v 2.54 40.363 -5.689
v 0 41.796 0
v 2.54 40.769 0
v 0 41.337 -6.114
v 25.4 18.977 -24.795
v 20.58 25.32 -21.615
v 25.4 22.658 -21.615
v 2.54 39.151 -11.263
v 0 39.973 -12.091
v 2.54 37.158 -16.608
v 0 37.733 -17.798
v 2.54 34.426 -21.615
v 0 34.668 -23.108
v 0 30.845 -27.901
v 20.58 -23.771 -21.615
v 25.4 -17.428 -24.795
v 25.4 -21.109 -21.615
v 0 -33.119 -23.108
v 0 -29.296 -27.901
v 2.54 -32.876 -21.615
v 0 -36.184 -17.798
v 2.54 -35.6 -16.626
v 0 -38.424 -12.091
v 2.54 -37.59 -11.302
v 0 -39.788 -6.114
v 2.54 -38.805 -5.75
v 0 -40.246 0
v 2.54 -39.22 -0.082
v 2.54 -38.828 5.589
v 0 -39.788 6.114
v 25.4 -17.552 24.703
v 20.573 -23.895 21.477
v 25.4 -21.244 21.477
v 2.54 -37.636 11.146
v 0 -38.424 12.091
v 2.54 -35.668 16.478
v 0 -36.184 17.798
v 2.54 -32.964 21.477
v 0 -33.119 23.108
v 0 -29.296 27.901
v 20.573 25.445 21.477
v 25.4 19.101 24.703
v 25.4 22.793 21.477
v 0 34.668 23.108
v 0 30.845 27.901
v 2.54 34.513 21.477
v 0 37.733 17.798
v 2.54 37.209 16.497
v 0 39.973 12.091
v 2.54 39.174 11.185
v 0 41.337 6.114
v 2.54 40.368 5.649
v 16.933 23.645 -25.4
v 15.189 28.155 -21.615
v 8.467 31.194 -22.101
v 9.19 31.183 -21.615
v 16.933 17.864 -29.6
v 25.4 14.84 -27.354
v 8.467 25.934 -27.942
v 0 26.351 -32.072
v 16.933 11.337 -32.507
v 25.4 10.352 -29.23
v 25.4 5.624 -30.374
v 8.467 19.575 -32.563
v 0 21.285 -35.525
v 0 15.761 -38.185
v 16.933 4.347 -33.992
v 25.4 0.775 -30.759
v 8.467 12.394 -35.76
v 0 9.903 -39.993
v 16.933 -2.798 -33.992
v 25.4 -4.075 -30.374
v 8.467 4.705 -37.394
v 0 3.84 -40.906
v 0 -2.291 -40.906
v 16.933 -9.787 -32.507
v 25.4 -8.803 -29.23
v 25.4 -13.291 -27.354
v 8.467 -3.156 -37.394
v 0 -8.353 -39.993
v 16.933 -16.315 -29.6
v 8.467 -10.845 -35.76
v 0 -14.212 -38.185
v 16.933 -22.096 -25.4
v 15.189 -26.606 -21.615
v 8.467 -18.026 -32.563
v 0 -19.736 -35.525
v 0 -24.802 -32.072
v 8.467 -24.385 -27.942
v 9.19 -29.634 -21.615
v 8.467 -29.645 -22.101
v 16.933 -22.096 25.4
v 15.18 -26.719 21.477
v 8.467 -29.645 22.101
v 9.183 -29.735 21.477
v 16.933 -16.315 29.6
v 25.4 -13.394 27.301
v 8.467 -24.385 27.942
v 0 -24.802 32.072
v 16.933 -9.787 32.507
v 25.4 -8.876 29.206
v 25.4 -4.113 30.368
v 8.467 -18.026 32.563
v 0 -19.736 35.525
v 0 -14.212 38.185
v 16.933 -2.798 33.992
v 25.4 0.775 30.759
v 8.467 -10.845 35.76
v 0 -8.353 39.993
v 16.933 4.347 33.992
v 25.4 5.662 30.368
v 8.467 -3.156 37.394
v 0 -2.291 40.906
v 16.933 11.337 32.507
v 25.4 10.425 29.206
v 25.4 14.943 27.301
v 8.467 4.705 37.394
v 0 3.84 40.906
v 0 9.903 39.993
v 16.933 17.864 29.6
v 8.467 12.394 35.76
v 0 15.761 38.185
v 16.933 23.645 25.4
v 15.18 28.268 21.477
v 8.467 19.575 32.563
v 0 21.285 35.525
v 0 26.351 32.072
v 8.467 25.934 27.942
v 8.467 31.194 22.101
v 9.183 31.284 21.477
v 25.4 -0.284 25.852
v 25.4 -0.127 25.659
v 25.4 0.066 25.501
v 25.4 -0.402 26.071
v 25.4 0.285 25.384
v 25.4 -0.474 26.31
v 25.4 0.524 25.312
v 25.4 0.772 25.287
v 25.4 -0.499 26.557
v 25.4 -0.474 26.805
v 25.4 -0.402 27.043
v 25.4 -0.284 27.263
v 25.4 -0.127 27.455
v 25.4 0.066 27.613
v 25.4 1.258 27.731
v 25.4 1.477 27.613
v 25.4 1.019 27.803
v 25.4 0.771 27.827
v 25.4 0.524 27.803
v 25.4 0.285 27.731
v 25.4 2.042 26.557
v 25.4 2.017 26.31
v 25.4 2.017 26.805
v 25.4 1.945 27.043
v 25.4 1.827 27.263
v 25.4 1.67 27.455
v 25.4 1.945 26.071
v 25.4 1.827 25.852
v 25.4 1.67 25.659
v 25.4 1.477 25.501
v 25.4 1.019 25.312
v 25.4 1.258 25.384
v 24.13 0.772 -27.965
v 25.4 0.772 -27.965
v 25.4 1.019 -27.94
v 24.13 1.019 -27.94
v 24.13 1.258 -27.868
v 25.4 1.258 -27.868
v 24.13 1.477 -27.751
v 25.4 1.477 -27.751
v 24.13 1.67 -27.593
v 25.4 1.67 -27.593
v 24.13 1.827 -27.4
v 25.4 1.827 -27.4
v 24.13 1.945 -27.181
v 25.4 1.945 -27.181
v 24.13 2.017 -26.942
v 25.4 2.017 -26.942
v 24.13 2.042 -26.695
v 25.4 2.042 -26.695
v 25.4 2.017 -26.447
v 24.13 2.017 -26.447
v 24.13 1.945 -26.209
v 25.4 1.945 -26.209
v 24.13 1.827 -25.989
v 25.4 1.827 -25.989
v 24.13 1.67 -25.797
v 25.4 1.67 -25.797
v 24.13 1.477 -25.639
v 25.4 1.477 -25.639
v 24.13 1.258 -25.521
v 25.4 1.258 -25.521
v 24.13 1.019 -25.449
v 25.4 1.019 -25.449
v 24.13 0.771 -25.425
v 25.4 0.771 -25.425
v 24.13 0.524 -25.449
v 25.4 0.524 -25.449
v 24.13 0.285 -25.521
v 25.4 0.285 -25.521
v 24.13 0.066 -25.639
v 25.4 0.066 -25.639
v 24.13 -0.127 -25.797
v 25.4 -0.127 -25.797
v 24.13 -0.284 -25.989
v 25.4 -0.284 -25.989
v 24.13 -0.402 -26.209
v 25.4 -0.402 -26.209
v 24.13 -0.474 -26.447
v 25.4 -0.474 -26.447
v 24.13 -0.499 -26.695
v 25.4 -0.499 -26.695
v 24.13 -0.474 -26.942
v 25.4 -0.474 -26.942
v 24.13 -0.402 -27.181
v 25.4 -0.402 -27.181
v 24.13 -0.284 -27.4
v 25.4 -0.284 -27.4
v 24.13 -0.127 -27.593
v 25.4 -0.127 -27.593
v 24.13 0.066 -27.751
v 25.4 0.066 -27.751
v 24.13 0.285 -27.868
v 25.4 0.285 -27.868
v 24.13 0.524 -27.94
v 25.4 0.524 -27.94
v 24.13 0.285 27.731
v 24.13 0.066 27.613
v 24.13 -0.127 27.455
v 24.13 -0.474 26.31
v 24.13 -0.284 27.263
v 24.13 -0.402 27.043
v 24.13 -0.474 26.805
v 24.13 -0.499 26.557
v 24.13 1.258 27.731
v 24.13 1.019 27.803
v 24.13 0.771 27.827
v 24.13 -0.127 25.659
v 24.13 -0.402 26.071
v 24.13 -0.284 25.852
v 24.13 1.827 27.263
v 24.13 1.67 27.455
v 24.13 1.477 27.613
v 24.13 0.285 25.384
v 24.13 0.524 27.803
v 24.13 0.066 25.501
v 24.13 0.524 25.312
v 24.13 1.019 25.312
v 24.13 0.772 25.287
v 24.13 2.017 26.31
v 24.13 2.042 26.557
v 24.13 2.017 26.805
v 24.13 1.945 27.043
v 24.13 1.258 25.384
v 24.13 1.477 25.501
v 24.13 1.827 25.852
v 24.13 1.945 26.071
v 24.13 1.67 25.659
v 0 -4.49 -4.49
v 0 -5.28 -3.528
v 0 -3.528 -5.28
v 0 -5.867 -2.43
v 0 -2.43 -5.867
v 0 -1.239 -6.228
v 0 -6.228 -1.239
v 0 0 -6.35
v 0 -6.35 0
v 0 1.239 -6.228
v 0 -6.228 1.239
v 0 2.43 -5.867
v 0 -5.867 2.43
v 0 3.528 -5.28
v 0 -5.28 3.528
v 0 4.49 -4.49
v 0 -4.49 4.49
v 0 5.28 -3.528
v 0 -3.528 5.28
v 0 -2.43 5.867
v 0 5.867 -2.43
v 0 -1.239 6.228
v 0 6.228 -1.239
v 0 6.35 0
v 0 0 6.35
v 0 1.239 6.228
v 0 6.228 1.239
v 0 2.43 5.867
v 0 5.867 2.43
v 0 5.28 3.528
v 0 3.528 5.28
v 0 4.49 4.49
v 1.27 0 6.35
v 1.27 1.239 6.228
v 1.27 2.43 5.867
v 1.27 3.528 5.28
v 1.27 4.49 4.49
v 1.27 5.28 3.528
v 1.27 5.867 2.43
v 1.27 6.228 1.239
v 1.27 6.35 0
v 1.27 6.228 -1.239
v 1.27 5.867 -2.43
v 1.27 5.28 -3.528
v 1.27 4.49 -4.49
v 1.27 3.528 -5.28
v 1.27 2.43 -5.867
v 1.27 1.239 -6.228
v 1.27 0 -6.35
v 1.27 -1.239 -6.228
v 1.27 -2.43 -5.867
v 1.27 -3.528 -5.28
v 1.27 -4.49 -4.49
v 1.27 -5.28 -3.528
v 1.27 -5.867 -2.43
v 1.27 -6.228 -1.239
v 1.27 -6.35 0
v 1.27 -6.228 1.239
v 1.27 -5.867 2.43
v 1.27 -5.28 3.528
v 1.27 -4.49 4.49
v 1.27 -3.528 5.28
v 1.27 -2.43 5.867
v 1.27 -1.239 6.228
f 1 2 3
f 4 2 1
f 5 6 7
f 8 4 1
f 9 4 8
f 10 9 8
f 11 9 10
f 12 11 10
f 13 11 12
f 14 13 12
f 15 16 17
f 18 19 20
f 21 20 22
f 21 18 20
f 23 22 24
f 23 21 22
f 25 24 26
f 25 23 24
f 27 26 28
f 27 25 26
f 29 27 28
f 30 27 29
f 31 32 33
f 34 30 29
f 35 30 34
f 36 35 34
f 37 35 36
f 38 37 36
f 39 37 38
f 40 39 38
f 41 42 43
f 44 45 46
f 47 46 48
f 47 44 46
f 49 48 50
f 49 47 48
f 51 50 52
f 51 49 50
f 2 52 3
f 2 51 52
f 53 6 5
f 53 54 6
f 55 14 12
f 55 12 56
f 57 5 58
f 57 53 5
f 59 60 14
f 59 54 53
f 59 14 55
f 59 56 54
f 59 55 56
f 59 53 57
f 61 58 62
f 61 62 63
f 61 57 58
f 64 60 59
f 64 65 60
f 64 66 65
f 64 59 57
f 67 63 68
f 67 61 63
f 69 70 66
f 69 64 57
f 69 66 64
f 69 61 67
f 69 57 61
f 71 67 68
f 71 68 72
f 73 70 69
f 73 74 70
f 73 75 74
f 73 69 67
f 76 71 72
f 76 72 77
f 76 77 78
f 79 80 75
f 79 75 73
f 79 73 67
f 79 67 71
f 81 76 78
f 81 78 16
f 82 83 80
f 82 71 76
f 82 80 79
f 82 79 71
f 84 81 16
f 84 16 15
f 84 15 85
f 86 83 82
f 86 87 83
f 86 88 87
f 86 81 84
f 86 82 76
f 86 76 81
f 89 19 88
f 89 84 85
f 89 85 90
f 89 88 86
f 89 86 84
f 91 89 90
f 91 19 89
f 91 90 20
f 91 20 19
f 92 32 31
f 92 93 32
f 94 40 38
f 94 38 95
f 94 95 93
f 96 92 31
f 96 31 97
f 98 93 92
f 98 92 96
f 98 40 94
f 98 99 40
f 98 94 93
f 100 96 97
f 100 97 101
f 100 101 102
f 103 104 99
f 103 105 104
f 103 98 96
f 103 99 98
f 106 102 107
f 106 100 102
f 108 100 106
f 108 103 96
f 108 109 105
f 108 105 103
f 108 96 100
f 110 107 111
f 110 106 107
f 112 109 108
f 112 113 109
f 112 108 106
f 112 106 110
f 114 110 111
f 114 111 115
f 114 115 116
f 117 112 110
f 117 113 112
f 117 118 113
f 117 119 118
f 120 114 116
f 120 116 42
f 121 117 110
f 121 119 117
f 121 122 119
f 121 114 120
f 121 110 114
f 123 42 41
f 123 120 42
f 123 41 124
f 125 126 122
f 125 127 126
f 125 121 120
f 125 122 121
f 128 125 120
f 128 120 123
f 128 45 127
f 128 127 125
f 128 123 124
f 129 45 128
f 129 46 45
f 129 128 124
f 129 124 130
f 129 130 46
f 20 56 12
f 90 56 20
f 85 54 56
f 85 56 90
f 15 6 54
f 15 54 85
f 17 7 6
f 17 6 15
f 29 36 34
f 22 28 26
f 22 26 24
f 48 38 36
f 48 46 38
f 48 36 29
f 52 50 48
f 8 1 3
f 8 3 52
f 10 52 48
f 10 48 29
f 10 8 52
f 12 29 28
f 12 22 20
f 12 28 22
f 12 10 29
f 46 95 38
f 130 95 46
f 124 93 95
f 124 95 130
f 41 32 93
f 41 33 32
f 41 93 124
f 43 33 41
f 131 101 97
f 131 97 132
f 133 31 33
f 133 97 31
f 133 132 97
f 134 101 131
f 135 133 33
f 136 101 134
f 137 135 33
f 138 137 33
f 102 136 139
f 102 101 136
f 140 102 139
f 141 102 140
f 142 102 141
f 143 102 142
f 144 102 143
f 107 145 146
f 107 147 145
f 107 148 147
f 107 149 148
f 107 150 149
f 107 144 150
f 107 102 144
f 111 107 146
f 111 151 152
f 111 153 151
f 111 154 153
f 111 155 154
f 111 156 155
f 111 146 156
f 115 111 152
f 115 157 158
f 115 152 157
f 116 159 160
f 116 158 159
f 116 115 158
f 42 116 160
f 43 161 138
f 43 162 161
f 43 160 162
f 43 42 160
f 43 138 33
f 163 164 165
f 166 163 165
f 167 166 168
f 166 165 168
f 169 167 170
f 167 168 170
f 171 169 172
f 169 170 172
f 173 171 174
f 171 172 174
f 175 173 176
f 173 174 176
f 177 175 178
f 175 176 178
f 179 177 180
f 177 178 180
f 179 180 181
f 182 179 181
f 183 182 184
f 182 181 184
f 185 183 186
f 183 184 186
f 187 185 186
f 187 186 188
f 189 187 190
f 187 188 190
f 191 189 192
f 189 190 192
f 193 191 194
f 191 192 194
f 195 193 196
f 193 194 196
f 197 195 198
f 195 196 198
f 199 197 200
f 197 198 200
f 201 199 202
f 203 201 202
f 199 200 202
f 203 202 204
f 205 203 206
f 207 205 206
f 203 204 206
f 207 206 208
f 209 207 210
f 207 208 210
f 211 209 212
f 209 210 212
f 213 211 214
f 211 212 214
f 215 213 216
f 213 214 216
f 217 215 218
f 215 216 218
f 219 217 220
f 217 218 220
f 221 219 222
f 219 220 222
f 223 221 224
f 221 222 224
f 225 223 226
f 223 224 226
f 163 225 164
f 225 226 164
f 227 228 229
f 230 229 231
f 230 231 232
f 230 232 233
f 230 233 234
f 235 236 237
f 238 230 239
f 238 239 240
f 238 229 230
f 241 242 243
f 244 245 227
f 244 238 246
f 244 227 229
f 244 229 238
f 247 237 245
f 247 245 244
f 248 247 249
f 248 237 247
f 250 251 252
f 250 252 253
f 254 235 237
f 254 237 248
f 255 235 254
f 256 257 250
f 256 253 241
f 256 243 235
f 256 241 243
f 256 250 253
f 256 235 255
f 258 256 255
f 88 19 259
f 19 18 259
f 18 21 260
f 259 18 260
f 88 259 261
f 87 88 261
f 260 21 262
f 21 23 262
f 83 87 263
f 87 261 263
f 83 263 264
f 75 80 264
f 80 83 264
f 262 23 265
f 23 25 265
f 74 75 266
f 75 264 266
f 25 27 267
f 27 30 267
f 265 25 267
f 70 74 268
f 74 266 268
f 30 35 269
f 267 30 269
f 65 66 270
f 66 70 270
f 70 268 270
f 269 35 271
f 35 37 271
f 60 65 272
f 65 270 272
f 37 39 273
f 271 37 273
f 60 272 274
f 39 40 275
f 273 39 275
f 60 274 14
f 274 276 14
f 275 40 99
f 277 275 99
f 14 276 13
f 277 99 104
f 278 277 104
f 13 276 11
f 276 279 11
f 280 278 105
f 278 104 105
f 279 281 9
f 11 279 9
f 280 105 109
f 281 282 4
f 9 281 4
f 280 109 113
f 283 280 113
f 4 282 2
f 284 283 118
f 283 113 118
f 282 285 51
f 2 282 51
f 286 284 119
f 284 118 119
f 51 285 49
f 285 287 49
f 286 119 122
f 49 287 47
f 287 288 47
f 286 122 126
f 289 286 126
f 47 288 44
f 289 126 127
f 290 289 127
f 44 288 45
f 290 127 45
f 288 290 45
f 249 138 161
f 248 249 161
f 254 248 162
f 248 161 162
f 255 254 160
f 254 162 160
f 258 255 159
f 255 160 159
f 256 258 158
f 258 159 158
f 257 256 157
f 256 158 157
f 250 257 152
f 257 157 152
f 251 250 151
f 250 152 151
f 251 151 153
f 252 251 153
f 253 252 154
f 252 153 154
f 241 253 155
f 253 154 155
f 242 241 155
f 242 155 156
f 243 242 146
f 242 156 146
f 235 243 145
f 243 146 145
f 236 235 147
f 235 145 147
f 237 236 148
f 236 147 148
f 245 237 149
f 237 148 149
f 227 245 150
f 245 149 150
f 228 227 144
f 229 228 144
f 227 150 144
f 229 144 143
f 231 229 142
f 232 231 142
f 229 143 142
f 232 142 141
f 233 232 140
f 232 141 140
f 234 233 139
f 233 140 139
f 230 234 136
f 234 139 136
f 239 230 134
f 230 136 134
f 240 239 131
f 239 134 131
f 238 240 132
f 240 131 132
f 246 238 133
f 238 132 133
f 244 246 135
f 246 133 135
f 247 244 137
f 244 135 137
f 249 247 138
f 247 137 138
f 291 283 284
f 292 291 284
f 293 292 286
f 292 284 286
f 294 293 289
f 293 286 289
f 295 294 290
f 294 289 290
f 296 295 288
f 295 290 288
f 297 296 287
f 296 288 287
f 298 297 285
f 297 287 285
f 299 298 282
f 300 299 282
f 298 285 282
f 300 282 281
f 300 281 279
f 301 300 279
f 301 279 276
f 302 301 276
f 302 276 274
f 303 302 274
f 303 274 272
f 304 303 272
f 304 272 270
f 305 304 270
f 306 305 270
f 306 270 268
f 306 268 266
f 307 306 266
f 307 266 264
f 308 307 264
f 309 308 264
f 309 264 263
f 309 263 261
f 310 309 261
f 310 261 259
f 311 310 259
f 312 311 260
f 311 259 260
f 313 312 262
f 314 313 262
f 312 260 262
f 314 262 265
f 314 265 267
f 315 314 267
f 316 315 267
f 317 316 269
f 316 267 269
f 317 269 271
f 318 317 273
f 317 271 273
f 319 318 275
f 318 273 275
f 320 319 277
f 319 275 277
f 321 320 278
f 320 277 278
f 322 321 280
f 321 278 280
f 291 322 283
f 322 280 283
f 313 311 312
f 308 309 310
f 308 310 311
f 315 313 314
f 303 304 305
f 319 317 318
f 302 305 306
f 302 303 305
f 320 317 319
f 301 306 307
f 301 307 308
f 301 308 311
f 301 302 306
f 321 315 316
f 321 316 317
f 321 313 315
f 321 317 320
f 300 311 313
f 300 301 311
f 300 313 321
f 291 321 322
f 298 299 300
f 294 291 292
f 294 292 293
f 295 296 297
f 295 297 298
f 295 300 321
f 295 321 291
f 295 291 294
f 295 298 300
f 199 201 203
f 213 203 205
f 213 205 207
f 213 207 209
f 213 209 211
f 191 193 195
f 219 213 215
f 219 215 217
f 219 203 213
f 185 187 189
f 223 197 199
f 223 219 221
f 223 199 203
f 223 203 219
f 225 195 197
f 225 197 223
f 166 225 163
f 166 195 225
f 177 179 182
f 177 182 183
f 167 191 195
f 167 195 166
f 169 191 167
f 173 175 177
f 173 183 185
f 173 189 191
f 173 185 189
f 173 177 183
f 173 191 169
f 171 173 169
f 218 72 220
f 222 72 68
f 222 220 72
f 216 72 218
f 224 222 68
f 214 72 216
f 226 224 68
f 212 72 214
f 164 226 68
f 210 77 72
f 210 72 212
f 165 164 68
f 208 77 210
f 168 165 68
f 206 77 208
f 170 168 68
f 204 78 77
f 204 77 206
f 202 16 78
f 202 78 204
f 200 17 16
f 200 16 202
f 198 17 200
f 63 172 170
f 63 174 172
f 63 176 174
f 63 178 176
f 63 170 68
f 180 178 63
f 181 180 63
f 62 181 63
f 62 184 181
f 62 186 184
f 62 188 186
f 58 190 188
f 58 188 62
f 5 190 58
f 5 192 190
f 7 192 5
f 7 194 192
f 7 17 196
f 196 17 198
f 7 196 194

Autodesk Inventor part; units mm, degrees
ref_plane "YZ Plane" through (0, 0, 0) normal (1, 0, 0) x (0, 1, 0)
ref_plane "XZ Plane" through (0, 0, 0) normal (0, 1, 0) x (-1, 0, 0)
ref_plane "XY Plane" through (0, 0, 0) normal (0, 0, 1) x (1, 0, 0)
sketch "Sketch1" plane through (0, 0, 0) normal (1, 0, 0) x (0, 1, 0)
  circle A0 centre (0.7746, 0) radius 41.021
  point P0 (0, 0)
  dimension "d1" = 82.042
extrude "Extrusion1" add sketch "Sketch1" along normal blind 25.4 draft -22
sketch "Sketch3" plane through (25.4, 0.7746, 0) normal (1, 0, 0) x (0, 0, -1)
  circle A0 centre (0, 0) radius 30.7587 projected
  line L0 (0, 0) -> (-21.4773, 0)
  line L1 (-21.4773, 0) -> (-21.4773, 41.021)
  line L2 (-21.4773, 41.021) -> (0, 41.021)
  line L3 (0, 41.021) -> (0, 0)
  line L4 (30.7587, 0) -> (21.6147, 0)
  line L5 (-21.4773, 41.021) -> (21.6147, 41.021)
  line L6 (21.6147, 41.021) -> (21.6147, -46.8819)
  line L7 (21.6147, -46.8819) -> (-21.4773, -46.8819)
  line L8 (-21.4773, -46.8819) -> (-21.4773, 41.021)
  point P0 (0, -0.7746)
  dimension "d5" = 9.144
extrude "Extrusion2" cut sketch "Sketch3" against normal blind 22.86 contours L6 A0 L8 L0 L3 | A0 L3 L5 L6 | L6 L7 L8 A0 | L3 L0 L1 A0 | A0 L1 L2 L3
sketch "Sketch5" plane through (0, 0.7746, 0) normal (-1, 0, 0) x (0, 0, 1)
  circle A0 centre (0, -0.7746) radius 6.35
  dimension "d13" = 12.7
extrude "Extrusion4" cut sketch "Sketch5" against normal blind 1.27
sketch "Sketch6" plane through (25.4, 0, 0) normal (1, 0, 0) x (0, 0, -1)
  circle A0 centre (-26.5573, 0.7715) radius 1.27
  circle A1 centre (-26.5573, 0.7715) radius 1.27
  point P0 (0, 0)
extrude "Extrusion5" cut sketch "Sketch6" against normal blind 1.27
sketch "Sketch8" plane through (25.4, 0, 0) normal (1, 0, 0) x (0, 0, -1)
  circle A0 centre (26.6947, 0.7715) radius 1.27 projected
  point P0 (0, 0)
extrude "Extrusion7" cut sketch "Sketch8" against normal blind 1.27
properties part number "1st base" material "UHMW, White"
